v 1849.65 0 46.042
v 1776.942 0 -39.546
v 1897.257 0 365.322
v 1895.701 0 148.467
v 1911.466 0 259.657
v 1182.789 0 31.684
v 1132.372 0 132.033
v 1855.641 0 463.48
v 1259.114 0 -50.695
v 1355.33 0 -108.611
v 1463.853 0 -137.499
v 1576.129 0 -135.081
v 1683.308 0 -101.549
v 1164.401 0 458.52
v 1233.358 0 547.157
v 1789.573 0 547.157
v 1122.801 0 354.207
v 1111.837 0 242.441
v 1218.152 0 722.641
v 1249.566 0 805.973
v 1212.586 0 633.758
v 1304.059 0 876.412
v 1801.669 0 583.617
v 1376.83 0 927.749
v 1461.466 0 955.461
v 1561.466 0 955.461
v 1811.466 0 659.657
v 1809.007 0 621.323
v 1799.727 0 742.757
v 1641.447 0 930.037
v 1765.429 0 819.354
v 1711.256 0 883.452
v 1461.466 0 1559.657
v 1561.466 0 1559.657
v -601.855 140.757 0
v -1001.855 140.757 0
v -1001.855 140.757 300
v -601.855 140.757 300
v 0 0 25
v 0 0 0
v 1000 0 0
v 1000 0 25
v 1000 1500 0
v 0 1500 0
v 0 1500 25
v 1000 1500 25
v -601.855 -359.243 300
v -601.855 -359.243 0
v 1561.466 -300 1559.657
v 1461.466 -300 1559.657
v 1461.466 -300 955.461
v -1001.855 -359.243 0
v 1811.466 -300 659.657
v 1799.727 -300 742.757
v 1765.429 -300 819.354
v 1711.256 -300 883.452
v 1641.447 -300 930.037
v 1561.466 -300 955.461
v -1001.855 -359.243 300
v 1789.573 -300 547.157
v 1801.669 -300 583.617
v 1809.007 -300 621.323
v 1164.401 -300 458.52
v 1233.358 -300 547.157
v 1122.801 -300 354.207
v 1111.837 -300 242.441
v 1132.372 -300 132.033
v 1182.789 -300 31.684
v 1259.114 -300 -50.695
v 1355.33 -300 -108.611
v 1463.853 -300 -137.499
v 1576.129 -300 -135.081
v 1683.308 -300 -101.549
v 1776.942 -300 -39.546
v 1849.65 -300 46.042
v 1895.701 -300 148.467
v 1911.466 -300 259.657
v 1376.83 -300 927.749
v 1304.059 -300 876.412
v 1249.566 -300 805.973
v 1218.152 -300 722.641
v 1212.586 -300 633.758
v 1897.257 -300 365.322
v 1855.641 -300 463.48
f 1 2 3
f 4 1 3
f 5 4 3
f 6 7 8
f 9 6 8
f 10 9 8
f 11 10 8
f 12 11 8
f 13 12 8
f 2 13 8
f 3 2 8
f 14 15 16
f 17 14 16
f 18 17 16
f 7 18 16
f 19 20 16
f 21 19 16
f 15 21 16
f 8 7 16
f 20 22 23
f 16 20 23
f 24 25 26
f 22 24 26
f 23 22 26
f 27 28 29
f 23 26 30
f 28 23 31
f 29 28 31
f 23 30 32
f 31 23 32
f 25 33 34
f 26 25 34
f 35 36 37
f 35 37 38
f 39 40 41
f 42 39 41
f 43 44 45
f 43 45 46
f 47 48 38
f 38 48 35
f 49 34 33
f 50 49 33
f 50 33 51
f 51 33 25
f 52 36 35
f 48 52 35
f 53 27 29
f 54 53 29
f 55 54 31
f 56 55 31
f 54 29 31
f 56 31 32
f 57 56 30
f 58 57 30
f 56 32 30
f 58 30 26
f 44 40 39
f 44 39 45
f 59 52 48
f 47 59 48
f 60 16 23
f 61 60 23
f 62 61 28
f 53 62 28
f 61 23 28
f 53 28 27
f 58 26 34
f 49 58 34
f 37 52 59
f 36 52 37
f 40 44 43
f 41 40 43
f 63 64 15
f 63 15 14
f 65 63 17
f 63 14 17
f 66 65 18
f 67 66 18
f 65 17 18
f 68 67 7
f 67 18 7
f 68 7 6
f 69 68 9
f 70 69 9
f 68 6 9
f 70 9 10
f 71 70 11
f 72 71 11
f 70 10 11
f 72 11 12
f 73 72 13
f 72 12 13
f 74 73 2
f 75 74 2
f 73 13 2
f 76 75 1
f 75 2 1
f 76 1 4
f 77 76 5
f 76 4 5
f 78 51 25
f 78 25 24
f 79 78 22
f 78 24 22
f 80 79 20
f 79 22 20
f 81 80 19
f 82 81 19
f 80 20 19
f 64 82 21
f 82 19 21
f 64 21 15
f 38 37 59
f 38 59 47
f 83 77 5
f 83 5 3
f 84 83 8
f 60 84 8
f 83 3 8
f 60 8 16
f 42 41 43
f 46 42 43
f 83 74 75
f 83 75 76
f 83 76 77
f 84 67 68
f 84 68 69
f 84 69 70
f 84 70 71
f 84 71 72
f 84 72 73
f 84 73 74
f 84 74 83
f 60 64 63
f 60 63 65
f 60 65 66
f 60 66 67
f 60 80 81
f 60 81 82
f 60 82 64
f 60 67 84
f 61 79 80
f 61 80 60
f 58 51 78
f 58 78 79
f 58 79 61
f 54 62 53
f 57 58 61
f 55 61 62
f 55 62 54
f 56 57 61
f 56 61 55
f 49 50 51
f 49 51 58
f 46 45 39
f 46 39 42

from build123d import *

# Parameters (mm, degrees)
F1_DEPTH = 300
F2_W     = 400
F2_H     = 500
F3_DEPTH = 300
F0_W     = 1000
F0_H     = 1500
F4_DEPTH = 25


with BuildPart() as f1:
    # F5 (on Front) → F1 (new body)
    with BuildSketch(Plane.XZ):
        with BuildLine():
            ThreePointArc((1233.358442, 547.15737), (1355.32969, -108.610859), (1911.465885, 259.65737))
            ThreePointArc((1911.465885, 259.65737), (1879.734114, 415.793565), (1789.573328, 547.15737))
            ThreePointArc((1789.573328, 547.15737), (1511.465885, 359.65737), (1233.358442, 547.15737))
        make_face()
        with BuildLine():
            ThreePointArc((1233.358442, 547.15737), (1511.465885, 659.65737), (1789.573328, 547.15737))
            ThreePointArc((1789.573328, 547.15737), (1805.941888, 602.352191), (1811.465885, 659.65737))
            ThreePointArc((1811.465885, 659.65737), (1740.59467, 853.306537), (1561.465885, 955.461359))
            Line((1561.465885, 955.461359), (1461.465885, 955.461359))
            ThreePointArc((1461.465885, 955.461359), (1249.565789, 805.973259), (1233.358442, 547.15737))
        make_face()
        with BuildLine():
            ThreePointArc((1233.358442, 547.15737), (1511.465885, 359.65737), (1789.573328, 547.15737))
            ThreePointArc((1789.573328, 547.15737), (1511.465885, 659.65737), (1233.358442, 547.15737))
        make_face()
        with BuildLine():
            ThreePointArc((1561.465885, 955.461359), (1511.465885, 959.65737), (1461.465885, 955.461359))
            Line((1461.465885, 955.461359), (1561.465885, 955.461359))
        make_face()
        with BuildLine():
            Line((1461.465885, 1559.65737), (1461.465885, 955.461359))
            ThreePointArc((1461.465885, 955.461359), (1511.465885, 959.65737), (1561.465885, 955.461359))
            Line((1561.465885, 955.461359), (1561.465885, 1559.65737))
            Line((1561.465885, 1559.65737), (1461.465885, 1559.65737))
        make_face()
    extrude(amount=F1_DEPTH)


with BuildPart() as f3:
    # F2 (on Top) → F3 (new body)
    with BuildSketch(Plane.XY):
        with Locations((-801.855135, -109.242648)):
            Rectangle(F2_W, F2_H)
    extrude(amount=F3_DEPTH)


with BuildPart() as f4:
    # F0 (on Top) → F4 (new body)
    with BuildSketch(Plane.XY):
        with Locations((500, 750)):
            Rectangle(F0_W, F0_H)
    extrude(amount=F4_DEPTH)


solid = Compound([f1.part, f3.part, f4.part])
